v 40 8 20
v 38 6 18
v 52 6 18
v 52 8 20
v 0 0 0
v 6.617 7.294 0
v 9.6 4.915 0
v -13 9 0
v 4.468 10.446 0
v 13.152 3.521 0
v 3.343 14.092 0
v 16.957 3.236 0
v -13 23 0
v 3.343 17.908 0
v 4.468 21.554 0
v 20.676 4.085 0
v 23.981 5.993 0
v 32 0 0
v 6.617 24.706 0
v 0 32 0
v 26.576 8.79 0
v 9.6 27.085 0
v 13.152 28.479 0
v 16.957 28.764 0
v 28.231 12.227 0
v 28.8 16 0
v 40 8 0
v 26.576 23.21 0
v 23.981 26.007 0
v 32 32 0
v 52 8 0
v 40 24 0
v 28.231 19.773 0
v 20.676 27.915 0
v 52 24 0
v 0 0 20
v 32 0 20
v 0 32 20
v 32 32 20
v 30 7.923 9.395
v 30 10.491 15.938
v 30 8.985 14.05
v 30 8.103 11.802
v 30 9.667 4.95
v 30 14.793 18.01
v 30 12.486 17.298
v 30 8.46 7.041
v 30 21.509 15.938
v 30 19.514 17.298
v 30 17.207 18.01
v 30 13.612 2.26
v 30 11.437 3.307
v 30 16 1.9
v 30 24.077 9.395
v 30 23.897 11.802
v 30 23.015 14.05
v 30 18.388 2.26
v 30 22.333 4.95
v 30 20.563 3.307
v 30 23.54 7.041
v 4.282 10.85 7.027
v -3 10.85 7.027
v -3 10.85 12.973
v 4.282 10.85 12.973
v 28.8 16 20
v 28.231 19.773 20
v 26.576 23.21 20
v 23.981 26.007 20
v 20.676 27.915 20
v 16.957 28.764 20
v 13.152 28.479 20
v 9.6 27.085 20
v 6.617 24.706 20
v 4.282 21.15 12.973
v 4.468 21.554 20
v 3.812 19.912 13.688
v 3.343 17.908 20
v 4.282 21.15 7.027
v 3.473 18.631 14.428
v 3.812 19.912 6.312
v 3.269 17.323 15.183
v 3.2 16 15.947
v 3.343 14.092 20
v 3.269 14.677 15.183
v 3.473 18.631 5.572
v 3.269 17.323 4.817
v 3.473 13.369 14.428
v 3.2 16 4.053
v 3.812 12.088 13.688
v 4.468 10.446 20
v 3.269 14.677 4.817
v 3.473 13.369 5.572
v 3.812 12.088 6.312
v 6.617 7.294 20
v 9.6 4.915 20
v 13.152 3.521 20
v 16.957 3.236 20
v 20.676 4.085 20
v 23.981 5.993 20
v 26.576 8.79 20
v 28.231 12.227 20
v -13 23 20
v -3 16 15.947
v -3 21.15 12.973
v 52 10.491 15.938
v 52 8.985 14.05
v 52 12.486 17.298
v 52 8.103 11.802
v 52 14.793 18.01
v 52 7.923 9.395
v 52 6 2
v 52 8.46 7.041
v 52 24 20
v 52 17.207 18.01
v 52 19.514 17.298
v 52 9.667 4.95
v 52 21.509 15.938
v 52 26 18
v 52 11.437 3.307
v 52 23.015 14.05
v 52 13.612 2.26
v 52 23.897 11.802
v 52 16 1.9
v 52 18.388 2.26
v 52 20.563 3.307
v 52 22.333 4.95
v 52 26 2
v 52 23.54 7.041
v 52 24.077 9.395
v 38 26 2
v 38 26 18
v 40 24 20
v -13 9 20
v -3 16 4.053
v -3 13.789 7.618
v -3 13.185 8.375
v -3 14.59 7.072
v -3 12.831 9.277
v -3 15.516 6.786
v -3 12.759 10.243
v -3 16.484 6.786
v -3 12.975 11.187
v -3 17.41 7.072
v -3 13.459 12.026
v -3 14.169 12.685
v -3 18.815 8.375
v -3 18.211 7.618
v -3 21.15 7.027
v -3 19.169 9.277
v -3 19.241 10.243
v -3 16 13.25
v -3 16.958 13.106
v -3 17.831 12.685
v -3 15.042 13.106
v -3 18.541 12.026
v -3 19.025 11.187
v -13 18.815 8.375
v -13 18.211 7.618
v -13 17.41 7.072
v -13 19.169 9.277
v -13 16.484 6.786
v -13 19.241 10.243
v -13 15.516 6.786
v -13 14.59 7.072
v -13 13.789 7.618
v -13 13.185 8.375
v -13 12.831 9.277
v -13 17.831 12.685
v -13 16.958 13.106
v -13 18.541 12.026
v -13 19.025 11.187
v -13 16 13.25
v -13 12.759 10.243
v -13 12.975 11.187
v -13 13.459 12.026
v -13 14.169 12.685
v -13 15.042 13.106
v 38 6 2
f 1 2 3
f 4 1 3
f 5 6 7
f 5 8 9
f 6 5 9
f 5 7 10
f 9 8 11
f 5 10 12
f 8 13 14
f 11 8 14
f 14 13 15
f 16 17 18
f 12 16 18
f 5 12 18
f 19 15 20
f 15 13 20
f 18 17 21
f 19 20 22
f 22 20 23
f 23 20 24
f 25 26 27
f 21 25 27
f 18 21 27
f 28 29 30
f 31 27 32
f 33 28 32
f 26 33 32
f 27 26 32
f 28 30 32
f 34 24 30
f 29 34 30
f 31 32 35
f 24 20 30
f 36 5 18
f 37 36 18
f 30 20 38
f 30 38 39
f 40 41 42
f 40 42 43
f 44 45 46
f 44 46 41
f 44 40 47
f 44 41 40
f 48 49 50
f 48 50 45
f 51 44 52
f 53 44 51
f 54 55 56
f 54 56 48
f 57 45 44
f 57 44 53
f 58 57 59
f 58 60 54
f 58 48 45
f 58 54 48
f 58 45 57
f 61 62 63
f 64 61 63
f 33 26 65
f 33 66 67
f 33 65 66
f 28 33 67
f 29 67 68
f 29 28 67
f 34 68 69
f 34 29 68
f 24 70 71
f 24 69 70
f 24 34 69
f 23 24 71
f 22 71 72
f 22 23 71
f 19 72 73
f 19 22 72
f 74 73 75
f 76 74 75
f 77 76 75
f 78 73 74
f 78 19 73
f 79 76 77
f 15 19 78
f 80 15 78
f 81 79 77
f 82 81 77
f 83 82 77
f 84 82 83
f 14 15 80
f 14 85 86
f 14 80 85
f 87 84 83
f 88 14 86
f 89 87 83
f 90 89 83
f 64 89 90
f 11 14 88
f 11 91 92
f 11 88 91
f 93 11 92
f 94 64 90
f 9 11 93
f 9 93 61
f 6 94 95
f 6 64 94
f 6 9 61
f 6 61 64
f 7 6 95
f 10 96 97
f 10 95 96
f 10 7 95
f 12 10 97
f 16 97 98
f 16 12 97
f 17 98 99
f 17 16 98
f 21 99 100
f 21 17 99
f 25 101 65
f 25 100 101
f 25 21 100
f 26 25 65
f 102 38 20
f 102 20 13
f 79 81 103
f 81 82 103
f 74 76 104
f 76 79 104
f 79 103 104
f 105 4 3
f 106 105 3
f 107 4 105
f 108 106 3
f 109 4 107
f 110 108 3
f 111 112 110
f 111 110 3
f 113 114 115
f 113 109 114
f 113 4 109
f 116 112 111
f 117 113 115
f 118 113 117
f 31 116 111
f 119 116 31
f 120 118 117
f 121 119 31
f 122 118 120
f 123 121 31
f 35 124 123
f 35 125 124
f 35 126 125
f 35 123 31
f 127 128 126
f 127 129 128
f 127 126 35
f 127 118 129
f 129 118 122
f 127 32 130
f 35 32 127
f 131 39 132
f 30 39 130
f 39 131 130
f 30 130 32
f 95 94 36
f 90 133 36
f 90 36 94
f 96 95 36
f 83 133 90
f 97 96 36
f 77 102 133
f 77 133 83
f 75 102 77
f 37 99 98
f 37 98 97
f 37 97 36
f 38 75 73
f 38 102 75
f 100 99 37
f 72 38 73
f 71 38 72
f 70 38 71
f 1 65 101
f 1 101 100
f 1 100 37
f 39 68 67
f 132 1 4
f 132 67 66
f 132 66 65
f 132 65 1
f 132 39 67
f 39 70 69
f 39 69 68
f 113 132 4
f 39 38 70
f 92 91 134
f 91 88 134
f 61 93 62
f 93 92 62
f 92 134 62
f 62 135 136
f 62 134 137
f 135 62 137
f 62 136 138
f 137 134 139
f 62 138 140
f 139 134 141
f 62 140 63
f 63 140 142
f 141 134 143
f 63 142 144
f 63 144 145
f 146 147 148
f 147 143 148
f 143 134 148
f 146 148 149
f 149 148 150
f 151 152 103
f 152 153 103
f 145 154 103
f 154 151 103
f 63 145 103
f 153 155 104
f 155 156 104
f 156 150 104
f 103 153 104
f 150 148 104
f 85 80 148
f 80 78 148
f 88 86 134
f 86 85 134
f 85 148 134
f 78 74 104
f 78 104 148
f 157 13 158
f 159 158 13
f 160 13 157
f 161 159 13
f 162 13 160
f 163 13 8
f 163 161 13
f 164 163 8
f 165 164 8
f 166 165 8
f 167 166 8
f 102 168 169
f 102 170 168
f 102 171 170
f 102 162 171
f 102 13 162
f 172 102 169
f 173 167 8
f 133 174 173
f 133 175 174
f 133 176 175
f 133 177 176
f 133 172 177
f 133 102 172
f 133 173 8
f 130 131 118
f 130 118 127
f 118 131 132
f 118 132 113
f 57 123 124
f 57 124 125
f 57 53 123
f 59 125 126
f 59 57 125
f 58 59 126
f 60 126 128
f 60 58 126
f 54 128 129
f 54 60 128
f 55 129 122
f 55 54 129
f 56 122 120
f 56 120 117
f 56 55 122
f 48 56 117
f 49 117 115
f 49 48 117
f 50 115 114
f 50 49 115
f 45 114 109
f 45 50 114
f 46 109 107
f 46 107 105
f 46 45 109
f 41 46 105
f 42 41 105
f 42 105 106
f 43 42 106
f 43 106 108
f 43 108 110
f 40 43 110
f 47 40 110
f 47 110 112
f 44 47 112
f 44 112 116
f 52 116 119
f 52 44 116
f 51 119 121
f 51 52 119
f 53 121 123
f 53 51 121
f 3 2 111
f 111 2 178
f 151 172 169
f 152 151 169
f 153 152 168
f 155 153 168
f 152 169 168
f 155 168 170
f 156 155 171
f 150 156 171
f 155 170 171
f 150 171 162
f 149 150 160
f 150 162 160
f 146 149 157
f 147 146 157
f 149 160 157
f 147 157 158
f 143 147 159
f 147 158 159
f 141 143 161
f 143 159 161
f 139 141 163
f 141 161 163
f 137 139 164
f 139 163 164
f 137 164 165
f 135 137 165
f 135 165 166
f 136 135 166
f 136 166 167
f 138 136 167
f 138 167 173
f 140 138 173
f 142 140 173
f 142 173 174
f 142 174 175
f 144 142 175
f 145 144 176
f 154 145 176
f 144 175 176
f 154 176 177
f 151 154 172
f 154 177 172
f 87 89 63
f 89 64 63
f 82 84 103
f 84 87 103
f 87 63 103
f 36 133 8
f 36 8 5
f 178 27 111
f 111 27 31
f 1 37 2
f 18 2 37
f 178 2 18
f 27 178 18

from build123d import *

# Parameters (mm, degrees)
ESQUISSE1_W                  = 32
ESQUISSE1_H                  = 32
BOSS_EXTRU_1_DEPTH           = 20
ENL_V_MAT_EXTRU_1_DEPTH      = 50.477267507
ENL_V_MAT_EXTRU_1_DEPTH_BACK = 50.477267507
ESQUISSE2_R                  = 12.8
BOSS_EXTRU_2_DEPTH           = 20
ESQUISSE4_R                  = 3.25
ENL_V_MAT_EXTRU_2_DEPTH      = 10
ENL_V_MAT_EXTRU_3_DEPTH      = 20
ESQUISSE6_W                  = 20
ESQUISSE6_H                  = 20
ESQUISSE6_R                  = 8.1
BOSS_EXTRU_3_DEPTH           = 20
CHANFREIN1_SIZE              = 6
CHANFREIN2_SIZE              = 2
ENL_V_START                  = -2
ESQUISSE7_R                  = 8.1
ENL_V_MAT_EXTRU_4_DEPTH      = 2


with BuildPart() as part:
    # Esquisse1 → Boss.-Extru.1 (new body)
    with BuildSketch(Plane.XY):
        with Locations((16, 16)):
            Rectangle(ESQUISSE1_W, ESQUISSE1_H)
    extrude(amount=BOSS_EXTRU_1_DEPTH)

    # Esquisse2 → Enlèv. mat.-Extru.1 (cut, two sides: drawn at the far end of the back side and taken through both)
    with BuildSketch(Plane.XY.offset(20).offset(-ENL_V_MAT_EXTRU_1_DEPTH_BACK)):
        with Locations((16, 16)):
            Circle(ESQUISSE2_R)
    extrude(amount=ENL_V_MAT_EXTRU_1_DEPTH + ENL_V_MAT_EXTRU_1_DEPTH_BACK, mode=Mode.SUBTRACT)

    # Esquisse3 → Boss.-Extru.2 (add)
    with BuildSketch(Plane.XY.offset(20)):
        Polygon((0, 0), (0, 32), (-13, 23), (-13, 9), align=None)
    extrude(amount=-BOSS_EXTRU_2_DEPTH)

    # Esquisse4 → Enlèv. mat.-Extru.2 (cut)
    with BuildSketch(Plane.ZY.offset(13)):
        with Locations((10, 16)):
            Circle(ESQUISSE4_R)
    extrude(amount=-ENL_V_MAT_EXTRU_2_DEPTH, mode=Mode.SUBTRACT)

    # Esquisse5 → Enlèv. mat.-Extru.3 (cut)
    with BuildSketch(Plane.ZY.offset(3)):
        Polygon((12.973353886, 10.85), (15.946707773, 16), (12.973353886, 21.15), (7.026646114, 21.15), (4.053292227, 16), (7.026646114, 10.85), align=None)
    extrude(amount=-ENL_V_MAT_EXTRU_3_DEPTH, mode=Mode.SUBTRACT)

    # Esquisse6 → Boss.-Extru.3 (add)
    with BuildSketch(Plane(origin=(32, 0, 0), x_dir=(0, 0, -1), z_dir=(1, 0, 0))):
        with Locations((-10, 16)):
            Rectangle(ESQUISSE6_W, ESQUISSE6_H)
        with Locations((-10, 16)):
            Circle(ESQUISSE6_R, mode=Mode.SUBTRACT)
    extrude(amount=BOSS_EXTRU_3_DEPTH)

    # Chanfrein1
    chanfrein1_edges = [part.edges().sort_by_distance(p)[0] for p in [
        (32, 6, 10),
        (32, 26, 10),
    ]]
    chamfer(chanfrein1_edges, length=CHANFREIN1_SIZE - 0.0001)  # a hair under: the kernel refuses the full size

    # Chanfrein2
    chanfrein2_edges = [part.edges().sort_by_distance(p)[0] for p in [
        (44.99995, 6, 20),
        (44.99995, 6, 0),
        (44.99995, 26, 0),
        (44.99995, 26, 20),
    ]]
    chamfer(chanfrein2_edges, length=CHANFREIN2_SIZE)

    # Esquisse7 → Enlèv. mat.-Extru.4 (cut)
    with BuildSketch(Plane(origin=(32, 0, 0), x_dir=(0, 0, -1), z_dir=(1, 0, 0)).offset(ENL_V_START)):
        with Locations((-10, 16)):
            Circle(ESQUISSE7_R)
    extrude(amount=ENL_V_MAT_EXTRU_4_DEPTH, mode=Mode.SUBTRACT)


solid = part.part
